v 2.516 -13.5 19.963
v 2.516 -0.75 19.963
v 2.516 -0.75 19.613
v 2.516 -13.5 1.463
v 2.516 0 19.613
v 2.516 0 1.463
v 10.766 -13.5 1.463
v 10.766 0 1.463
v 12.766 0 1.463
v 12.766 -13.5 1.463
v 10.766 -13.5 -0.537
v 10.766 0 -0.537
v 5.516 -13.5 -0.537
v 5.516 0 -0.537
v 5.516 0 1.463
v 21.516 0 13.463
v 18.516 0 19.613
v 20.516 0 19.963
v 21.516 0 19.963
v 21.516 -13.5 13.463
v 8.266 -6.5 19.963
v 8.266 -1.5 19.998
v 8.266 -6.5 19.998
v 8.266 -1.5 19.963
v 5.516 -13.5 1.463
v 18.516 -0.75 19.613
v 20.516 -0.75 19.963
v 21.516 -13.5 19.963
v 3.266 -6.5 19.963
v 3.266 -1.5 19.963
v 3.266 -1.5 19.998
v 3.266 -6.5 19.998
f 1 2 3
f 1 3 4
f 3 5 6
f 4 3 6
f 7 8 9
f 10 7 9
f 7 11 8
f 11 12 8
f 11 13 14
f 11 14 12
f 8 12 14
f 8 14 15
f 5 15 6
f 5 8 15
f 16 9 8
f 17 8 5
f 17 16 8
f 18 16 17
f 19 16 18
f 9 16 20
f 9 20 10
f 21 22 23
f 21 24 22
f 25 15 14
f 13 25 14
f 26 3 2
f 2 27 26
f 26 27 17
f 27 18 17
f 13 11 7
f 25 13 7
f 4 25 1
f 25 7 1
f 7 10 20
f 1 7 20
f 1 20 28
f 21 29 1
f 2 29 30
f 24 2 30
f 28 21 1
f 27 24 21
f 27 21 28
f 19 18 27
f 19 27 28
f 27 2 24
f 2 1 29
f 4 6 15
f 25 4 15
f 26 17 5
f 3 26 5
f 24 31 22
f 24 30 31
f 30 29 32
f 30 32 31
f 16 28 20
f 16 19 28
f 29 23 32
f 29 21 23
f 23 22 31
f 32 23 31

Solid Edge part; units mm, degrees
sketch "Sketch1" plane through (33.766, 0, 12.7127) normal (0, -1, 0) x (1, 0, 0)
  line L0 (-12.25, 0.75) -> (-21, -11.25)
  line L1 (-12.25, 7.25) -> (-12.25, 0.75)
  line L2 (-31.25, 7.25) -> (-12.25, 7.25)
  line L3 (-31.25, 7.25) -> (-31.25, -11.25)
  line L4 (-31.25, -11.25) -> (-28.25, -11.25)
  line L5 (-28.25, -11.25) -> (-28.25, -13.25)
  line L6 (-28.25, -13.25) -> (-23, -13.25)
  line L7 (-23, -13.25) -> (-23, -11.25)
  line L8 (-23, -11.25) -> (-21, -11.25)
extrude "Protrusion1" add sketch "Sketch1" along normal blind 13.5
sketch "Sketch2" plane through (12.016, -6.75, 19.9627) normal (0, 0, 1) x (1, 0, 0)
  line L0 (-9.5, 6.75) -> (6.5, 6.75)
  line L1 (6.5, 6.75) -> (6.5, 6)
  line L2 (6.5, 6) -> (-9.5, 6)
  line L3 (-9.5, 6) -> (-9.5, 6.75)
extrude "ExtrudedCutout_1" cut sketch "Sketch2" against normal blind 0.35
sketch "Sketch3" plane through (12.016, 0, 9.7127) normal (0, 1, 0) x (-1, 0, 0)
  line L0 (-8.5, 10.25) -> (-6.5, 9.9)
  line L1 (-6.5, 9.9) -> (-6.5, 10.25)
  line L2 (-6.5, 10.25) -> (-8.5, 10.25)
extrude "ExtrudedCutout_2" cut sketch "Sketch3" against normal blind 0.75
sketch "Sketch4" plane through (12.016, -6.75, 19.9627) normal (0, 0, 1) x (0, -1, 0)
  line L0 (-5.25, -8.75) -> (-5.25, -3.75)
  line L1 (-5.25, -3.75) -> (-0.25, -3.75)
  line L2 (-0.25, -3.75) -> (-0.25, -8.75)
  line L3 (-0.25, -8.75) -> (-5.25, -8.75)
extrude "ExtrudedProtrusion_2" add sketch "Sketch4" along normal blind 0.035
properties material "Stainless Steel, 420"
